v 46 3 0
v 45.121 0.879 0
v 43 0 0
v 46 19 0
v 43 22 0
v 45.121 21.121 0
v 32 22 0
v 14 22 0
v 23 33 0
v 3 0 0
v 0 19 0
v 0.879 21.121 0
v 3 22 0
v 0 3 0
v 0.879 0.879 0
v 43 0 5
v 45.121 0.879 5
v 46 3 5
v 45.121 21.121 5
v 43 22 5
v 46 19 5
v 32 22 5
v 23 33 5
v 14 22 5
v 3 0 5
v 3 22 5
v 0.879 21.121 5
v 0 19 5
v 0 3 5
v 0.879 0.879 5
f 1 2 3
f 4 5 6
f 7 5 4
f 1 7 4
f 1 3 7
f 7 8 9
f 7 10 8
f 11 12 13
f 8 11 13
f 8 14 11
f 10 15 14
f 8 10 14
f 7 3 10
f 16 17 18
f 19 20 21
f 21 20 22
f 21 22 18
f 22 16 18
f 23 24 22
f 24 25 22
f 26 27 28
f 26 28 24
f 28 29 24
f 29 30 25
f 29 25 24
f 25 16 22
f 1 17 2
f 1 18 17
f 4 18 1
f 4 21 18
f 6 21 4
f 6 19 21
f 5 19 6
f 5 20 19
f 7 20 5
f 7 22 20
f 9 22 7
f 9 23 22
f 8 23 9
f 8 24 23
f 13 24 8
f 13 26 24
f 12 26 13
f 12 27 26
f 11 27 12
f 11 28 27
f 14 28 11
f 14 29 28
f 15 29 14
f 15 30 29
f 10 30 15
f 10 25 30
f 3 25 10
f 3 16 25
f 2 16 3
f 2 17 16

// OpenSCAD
$fn = 32;

// ----------------------------------------------------------------------
// Ratchet pawl: 46 x 22 mm body, beak 11 mm сверху
// ----------------------------------------------------------------------

// --- parameters (mm) ---
profile_height = 5;       // extrusion height
profile_points = 15;      // points of the closed outline

profile = [[0, 3], [0.879, 0.879], [3, 0], [43, 0], [45.121, 0.879], [46, 3], [46, 19], [45.121, 21.121], [43, 22], [32, 22], [23, 33], [14, 22], [3, 22], [0.879, 21.121], [0, 19]];  // single closed polygon, 15 points, counter clockwise

// --- the one profile operation ---
linear_extrude(height = profile_height) polygon(points = profile);
